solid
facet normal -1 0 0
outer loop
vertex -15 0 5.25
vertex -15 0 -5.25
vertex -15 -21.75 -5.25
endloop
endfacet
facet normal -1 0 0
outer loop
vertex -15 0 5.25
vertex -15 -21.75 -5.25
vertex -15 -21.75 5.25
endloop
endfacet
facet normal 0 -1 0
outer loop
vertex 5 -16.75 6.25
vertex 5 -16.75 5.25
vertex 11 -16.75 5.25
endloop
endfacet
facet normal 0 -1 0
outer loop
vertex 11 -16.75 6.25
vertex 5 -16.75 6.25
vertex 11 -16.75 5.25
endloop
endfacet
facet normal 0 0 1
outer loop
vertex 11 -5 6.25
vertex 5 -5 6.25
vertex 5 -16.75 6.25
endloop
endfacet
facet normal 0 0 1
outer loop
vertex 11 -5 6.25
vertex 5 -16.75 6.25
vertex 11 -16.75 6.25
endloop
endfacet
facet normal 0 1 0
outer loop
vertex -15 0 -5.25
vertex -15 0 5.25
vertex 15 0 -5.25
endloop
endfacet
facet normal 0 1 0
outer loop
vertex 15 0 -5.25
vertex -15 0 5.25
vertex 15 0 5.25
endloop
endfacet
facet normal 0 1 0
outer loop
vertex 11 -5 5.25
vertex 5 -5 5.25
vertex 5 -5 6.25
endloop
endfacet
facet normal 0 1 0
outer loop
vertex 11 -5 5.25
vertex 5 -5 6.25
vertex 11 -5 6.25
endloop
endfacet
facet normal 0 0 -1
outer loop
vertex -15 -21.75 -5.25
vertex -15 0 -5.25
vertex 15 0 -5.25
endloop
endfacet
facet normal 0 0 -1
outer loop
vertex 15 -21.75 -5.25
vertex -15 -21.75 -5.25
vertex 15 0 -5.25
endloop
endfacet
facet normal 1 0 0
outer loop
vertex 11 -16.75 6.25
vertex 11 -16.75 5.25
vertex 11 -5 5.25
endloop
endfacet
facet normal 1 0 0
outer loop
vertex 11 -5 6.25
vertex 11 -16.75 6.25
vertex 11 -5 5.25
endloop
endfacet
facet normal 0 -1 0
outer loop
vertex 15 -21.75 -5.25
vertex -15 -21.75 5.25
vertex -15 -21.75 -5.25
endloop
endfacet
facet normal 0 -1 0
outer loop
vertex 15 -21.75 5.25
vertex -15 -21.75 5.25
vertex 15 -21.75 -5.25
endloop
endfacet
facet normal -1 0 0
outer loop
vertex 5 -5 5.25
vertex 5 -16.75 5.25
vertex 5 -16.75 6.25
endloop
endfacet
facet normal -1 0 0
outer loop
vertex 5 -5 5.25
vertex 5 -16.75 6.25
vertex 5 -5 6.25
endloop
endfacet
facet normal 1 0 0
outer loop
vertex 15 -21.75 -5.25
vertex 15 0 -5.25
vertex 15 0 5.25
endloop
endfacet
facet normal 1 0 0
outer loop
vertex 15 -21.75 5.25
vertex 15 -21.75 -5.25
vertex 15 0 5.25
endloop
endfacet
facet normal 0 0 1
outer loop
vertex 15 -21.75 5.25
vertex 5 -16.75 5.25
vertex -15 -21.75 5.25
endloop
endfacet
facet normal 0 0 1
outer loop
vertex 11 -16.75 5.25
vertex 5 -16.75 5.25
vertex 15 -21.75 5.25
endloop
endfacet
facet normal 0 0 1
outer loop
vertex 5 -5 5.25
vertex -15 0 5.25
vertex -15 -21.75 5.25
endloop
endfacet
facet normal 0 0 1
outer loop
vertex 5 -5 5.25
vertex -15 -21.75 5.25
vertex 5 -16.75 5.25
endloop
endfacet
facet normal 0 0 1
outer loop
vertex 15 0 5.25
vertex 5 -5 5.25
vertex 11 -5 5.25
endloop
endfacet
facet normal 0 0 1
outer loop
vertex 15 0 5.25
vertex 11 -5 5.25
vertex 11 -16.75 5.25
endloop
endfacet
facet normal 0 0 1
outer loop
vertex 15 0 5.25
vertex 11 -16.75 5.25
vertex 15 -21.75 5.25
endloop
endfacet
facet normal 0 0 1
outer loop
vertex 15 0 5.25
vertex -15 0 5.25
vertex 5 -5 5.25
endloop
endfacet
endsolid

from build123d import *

# Parameters (mm, degrees)
F0_W     = 2
F0_H     = 0.7
F1_DEPTH = 1.45
F2_SCALE = 15
F3_W     = 6
F3_H     = 11.75
F4_DEPTH = 1


with BuildPart() as f1:
    # F0 (on Front) → F1 (new body)
    with BuildSketch(Plane.XZ):
        Rectangle(F0_W, F0_H)
    extrude(amount=F1_DEPTH)


with BuildPart() as f1_1:
    # F2: moved
    add(f1.part.scale(F2_SCALE))

    # F3 (on face) → F4 (join)
    with BuildSketch(Plane.XY.offset(5.25)):
        with Locations((8, -10.875)):
            Rectangle(F3_W, F3_H)
    extrude(amount=F4_DEPTH)


solid = f1_1.part
